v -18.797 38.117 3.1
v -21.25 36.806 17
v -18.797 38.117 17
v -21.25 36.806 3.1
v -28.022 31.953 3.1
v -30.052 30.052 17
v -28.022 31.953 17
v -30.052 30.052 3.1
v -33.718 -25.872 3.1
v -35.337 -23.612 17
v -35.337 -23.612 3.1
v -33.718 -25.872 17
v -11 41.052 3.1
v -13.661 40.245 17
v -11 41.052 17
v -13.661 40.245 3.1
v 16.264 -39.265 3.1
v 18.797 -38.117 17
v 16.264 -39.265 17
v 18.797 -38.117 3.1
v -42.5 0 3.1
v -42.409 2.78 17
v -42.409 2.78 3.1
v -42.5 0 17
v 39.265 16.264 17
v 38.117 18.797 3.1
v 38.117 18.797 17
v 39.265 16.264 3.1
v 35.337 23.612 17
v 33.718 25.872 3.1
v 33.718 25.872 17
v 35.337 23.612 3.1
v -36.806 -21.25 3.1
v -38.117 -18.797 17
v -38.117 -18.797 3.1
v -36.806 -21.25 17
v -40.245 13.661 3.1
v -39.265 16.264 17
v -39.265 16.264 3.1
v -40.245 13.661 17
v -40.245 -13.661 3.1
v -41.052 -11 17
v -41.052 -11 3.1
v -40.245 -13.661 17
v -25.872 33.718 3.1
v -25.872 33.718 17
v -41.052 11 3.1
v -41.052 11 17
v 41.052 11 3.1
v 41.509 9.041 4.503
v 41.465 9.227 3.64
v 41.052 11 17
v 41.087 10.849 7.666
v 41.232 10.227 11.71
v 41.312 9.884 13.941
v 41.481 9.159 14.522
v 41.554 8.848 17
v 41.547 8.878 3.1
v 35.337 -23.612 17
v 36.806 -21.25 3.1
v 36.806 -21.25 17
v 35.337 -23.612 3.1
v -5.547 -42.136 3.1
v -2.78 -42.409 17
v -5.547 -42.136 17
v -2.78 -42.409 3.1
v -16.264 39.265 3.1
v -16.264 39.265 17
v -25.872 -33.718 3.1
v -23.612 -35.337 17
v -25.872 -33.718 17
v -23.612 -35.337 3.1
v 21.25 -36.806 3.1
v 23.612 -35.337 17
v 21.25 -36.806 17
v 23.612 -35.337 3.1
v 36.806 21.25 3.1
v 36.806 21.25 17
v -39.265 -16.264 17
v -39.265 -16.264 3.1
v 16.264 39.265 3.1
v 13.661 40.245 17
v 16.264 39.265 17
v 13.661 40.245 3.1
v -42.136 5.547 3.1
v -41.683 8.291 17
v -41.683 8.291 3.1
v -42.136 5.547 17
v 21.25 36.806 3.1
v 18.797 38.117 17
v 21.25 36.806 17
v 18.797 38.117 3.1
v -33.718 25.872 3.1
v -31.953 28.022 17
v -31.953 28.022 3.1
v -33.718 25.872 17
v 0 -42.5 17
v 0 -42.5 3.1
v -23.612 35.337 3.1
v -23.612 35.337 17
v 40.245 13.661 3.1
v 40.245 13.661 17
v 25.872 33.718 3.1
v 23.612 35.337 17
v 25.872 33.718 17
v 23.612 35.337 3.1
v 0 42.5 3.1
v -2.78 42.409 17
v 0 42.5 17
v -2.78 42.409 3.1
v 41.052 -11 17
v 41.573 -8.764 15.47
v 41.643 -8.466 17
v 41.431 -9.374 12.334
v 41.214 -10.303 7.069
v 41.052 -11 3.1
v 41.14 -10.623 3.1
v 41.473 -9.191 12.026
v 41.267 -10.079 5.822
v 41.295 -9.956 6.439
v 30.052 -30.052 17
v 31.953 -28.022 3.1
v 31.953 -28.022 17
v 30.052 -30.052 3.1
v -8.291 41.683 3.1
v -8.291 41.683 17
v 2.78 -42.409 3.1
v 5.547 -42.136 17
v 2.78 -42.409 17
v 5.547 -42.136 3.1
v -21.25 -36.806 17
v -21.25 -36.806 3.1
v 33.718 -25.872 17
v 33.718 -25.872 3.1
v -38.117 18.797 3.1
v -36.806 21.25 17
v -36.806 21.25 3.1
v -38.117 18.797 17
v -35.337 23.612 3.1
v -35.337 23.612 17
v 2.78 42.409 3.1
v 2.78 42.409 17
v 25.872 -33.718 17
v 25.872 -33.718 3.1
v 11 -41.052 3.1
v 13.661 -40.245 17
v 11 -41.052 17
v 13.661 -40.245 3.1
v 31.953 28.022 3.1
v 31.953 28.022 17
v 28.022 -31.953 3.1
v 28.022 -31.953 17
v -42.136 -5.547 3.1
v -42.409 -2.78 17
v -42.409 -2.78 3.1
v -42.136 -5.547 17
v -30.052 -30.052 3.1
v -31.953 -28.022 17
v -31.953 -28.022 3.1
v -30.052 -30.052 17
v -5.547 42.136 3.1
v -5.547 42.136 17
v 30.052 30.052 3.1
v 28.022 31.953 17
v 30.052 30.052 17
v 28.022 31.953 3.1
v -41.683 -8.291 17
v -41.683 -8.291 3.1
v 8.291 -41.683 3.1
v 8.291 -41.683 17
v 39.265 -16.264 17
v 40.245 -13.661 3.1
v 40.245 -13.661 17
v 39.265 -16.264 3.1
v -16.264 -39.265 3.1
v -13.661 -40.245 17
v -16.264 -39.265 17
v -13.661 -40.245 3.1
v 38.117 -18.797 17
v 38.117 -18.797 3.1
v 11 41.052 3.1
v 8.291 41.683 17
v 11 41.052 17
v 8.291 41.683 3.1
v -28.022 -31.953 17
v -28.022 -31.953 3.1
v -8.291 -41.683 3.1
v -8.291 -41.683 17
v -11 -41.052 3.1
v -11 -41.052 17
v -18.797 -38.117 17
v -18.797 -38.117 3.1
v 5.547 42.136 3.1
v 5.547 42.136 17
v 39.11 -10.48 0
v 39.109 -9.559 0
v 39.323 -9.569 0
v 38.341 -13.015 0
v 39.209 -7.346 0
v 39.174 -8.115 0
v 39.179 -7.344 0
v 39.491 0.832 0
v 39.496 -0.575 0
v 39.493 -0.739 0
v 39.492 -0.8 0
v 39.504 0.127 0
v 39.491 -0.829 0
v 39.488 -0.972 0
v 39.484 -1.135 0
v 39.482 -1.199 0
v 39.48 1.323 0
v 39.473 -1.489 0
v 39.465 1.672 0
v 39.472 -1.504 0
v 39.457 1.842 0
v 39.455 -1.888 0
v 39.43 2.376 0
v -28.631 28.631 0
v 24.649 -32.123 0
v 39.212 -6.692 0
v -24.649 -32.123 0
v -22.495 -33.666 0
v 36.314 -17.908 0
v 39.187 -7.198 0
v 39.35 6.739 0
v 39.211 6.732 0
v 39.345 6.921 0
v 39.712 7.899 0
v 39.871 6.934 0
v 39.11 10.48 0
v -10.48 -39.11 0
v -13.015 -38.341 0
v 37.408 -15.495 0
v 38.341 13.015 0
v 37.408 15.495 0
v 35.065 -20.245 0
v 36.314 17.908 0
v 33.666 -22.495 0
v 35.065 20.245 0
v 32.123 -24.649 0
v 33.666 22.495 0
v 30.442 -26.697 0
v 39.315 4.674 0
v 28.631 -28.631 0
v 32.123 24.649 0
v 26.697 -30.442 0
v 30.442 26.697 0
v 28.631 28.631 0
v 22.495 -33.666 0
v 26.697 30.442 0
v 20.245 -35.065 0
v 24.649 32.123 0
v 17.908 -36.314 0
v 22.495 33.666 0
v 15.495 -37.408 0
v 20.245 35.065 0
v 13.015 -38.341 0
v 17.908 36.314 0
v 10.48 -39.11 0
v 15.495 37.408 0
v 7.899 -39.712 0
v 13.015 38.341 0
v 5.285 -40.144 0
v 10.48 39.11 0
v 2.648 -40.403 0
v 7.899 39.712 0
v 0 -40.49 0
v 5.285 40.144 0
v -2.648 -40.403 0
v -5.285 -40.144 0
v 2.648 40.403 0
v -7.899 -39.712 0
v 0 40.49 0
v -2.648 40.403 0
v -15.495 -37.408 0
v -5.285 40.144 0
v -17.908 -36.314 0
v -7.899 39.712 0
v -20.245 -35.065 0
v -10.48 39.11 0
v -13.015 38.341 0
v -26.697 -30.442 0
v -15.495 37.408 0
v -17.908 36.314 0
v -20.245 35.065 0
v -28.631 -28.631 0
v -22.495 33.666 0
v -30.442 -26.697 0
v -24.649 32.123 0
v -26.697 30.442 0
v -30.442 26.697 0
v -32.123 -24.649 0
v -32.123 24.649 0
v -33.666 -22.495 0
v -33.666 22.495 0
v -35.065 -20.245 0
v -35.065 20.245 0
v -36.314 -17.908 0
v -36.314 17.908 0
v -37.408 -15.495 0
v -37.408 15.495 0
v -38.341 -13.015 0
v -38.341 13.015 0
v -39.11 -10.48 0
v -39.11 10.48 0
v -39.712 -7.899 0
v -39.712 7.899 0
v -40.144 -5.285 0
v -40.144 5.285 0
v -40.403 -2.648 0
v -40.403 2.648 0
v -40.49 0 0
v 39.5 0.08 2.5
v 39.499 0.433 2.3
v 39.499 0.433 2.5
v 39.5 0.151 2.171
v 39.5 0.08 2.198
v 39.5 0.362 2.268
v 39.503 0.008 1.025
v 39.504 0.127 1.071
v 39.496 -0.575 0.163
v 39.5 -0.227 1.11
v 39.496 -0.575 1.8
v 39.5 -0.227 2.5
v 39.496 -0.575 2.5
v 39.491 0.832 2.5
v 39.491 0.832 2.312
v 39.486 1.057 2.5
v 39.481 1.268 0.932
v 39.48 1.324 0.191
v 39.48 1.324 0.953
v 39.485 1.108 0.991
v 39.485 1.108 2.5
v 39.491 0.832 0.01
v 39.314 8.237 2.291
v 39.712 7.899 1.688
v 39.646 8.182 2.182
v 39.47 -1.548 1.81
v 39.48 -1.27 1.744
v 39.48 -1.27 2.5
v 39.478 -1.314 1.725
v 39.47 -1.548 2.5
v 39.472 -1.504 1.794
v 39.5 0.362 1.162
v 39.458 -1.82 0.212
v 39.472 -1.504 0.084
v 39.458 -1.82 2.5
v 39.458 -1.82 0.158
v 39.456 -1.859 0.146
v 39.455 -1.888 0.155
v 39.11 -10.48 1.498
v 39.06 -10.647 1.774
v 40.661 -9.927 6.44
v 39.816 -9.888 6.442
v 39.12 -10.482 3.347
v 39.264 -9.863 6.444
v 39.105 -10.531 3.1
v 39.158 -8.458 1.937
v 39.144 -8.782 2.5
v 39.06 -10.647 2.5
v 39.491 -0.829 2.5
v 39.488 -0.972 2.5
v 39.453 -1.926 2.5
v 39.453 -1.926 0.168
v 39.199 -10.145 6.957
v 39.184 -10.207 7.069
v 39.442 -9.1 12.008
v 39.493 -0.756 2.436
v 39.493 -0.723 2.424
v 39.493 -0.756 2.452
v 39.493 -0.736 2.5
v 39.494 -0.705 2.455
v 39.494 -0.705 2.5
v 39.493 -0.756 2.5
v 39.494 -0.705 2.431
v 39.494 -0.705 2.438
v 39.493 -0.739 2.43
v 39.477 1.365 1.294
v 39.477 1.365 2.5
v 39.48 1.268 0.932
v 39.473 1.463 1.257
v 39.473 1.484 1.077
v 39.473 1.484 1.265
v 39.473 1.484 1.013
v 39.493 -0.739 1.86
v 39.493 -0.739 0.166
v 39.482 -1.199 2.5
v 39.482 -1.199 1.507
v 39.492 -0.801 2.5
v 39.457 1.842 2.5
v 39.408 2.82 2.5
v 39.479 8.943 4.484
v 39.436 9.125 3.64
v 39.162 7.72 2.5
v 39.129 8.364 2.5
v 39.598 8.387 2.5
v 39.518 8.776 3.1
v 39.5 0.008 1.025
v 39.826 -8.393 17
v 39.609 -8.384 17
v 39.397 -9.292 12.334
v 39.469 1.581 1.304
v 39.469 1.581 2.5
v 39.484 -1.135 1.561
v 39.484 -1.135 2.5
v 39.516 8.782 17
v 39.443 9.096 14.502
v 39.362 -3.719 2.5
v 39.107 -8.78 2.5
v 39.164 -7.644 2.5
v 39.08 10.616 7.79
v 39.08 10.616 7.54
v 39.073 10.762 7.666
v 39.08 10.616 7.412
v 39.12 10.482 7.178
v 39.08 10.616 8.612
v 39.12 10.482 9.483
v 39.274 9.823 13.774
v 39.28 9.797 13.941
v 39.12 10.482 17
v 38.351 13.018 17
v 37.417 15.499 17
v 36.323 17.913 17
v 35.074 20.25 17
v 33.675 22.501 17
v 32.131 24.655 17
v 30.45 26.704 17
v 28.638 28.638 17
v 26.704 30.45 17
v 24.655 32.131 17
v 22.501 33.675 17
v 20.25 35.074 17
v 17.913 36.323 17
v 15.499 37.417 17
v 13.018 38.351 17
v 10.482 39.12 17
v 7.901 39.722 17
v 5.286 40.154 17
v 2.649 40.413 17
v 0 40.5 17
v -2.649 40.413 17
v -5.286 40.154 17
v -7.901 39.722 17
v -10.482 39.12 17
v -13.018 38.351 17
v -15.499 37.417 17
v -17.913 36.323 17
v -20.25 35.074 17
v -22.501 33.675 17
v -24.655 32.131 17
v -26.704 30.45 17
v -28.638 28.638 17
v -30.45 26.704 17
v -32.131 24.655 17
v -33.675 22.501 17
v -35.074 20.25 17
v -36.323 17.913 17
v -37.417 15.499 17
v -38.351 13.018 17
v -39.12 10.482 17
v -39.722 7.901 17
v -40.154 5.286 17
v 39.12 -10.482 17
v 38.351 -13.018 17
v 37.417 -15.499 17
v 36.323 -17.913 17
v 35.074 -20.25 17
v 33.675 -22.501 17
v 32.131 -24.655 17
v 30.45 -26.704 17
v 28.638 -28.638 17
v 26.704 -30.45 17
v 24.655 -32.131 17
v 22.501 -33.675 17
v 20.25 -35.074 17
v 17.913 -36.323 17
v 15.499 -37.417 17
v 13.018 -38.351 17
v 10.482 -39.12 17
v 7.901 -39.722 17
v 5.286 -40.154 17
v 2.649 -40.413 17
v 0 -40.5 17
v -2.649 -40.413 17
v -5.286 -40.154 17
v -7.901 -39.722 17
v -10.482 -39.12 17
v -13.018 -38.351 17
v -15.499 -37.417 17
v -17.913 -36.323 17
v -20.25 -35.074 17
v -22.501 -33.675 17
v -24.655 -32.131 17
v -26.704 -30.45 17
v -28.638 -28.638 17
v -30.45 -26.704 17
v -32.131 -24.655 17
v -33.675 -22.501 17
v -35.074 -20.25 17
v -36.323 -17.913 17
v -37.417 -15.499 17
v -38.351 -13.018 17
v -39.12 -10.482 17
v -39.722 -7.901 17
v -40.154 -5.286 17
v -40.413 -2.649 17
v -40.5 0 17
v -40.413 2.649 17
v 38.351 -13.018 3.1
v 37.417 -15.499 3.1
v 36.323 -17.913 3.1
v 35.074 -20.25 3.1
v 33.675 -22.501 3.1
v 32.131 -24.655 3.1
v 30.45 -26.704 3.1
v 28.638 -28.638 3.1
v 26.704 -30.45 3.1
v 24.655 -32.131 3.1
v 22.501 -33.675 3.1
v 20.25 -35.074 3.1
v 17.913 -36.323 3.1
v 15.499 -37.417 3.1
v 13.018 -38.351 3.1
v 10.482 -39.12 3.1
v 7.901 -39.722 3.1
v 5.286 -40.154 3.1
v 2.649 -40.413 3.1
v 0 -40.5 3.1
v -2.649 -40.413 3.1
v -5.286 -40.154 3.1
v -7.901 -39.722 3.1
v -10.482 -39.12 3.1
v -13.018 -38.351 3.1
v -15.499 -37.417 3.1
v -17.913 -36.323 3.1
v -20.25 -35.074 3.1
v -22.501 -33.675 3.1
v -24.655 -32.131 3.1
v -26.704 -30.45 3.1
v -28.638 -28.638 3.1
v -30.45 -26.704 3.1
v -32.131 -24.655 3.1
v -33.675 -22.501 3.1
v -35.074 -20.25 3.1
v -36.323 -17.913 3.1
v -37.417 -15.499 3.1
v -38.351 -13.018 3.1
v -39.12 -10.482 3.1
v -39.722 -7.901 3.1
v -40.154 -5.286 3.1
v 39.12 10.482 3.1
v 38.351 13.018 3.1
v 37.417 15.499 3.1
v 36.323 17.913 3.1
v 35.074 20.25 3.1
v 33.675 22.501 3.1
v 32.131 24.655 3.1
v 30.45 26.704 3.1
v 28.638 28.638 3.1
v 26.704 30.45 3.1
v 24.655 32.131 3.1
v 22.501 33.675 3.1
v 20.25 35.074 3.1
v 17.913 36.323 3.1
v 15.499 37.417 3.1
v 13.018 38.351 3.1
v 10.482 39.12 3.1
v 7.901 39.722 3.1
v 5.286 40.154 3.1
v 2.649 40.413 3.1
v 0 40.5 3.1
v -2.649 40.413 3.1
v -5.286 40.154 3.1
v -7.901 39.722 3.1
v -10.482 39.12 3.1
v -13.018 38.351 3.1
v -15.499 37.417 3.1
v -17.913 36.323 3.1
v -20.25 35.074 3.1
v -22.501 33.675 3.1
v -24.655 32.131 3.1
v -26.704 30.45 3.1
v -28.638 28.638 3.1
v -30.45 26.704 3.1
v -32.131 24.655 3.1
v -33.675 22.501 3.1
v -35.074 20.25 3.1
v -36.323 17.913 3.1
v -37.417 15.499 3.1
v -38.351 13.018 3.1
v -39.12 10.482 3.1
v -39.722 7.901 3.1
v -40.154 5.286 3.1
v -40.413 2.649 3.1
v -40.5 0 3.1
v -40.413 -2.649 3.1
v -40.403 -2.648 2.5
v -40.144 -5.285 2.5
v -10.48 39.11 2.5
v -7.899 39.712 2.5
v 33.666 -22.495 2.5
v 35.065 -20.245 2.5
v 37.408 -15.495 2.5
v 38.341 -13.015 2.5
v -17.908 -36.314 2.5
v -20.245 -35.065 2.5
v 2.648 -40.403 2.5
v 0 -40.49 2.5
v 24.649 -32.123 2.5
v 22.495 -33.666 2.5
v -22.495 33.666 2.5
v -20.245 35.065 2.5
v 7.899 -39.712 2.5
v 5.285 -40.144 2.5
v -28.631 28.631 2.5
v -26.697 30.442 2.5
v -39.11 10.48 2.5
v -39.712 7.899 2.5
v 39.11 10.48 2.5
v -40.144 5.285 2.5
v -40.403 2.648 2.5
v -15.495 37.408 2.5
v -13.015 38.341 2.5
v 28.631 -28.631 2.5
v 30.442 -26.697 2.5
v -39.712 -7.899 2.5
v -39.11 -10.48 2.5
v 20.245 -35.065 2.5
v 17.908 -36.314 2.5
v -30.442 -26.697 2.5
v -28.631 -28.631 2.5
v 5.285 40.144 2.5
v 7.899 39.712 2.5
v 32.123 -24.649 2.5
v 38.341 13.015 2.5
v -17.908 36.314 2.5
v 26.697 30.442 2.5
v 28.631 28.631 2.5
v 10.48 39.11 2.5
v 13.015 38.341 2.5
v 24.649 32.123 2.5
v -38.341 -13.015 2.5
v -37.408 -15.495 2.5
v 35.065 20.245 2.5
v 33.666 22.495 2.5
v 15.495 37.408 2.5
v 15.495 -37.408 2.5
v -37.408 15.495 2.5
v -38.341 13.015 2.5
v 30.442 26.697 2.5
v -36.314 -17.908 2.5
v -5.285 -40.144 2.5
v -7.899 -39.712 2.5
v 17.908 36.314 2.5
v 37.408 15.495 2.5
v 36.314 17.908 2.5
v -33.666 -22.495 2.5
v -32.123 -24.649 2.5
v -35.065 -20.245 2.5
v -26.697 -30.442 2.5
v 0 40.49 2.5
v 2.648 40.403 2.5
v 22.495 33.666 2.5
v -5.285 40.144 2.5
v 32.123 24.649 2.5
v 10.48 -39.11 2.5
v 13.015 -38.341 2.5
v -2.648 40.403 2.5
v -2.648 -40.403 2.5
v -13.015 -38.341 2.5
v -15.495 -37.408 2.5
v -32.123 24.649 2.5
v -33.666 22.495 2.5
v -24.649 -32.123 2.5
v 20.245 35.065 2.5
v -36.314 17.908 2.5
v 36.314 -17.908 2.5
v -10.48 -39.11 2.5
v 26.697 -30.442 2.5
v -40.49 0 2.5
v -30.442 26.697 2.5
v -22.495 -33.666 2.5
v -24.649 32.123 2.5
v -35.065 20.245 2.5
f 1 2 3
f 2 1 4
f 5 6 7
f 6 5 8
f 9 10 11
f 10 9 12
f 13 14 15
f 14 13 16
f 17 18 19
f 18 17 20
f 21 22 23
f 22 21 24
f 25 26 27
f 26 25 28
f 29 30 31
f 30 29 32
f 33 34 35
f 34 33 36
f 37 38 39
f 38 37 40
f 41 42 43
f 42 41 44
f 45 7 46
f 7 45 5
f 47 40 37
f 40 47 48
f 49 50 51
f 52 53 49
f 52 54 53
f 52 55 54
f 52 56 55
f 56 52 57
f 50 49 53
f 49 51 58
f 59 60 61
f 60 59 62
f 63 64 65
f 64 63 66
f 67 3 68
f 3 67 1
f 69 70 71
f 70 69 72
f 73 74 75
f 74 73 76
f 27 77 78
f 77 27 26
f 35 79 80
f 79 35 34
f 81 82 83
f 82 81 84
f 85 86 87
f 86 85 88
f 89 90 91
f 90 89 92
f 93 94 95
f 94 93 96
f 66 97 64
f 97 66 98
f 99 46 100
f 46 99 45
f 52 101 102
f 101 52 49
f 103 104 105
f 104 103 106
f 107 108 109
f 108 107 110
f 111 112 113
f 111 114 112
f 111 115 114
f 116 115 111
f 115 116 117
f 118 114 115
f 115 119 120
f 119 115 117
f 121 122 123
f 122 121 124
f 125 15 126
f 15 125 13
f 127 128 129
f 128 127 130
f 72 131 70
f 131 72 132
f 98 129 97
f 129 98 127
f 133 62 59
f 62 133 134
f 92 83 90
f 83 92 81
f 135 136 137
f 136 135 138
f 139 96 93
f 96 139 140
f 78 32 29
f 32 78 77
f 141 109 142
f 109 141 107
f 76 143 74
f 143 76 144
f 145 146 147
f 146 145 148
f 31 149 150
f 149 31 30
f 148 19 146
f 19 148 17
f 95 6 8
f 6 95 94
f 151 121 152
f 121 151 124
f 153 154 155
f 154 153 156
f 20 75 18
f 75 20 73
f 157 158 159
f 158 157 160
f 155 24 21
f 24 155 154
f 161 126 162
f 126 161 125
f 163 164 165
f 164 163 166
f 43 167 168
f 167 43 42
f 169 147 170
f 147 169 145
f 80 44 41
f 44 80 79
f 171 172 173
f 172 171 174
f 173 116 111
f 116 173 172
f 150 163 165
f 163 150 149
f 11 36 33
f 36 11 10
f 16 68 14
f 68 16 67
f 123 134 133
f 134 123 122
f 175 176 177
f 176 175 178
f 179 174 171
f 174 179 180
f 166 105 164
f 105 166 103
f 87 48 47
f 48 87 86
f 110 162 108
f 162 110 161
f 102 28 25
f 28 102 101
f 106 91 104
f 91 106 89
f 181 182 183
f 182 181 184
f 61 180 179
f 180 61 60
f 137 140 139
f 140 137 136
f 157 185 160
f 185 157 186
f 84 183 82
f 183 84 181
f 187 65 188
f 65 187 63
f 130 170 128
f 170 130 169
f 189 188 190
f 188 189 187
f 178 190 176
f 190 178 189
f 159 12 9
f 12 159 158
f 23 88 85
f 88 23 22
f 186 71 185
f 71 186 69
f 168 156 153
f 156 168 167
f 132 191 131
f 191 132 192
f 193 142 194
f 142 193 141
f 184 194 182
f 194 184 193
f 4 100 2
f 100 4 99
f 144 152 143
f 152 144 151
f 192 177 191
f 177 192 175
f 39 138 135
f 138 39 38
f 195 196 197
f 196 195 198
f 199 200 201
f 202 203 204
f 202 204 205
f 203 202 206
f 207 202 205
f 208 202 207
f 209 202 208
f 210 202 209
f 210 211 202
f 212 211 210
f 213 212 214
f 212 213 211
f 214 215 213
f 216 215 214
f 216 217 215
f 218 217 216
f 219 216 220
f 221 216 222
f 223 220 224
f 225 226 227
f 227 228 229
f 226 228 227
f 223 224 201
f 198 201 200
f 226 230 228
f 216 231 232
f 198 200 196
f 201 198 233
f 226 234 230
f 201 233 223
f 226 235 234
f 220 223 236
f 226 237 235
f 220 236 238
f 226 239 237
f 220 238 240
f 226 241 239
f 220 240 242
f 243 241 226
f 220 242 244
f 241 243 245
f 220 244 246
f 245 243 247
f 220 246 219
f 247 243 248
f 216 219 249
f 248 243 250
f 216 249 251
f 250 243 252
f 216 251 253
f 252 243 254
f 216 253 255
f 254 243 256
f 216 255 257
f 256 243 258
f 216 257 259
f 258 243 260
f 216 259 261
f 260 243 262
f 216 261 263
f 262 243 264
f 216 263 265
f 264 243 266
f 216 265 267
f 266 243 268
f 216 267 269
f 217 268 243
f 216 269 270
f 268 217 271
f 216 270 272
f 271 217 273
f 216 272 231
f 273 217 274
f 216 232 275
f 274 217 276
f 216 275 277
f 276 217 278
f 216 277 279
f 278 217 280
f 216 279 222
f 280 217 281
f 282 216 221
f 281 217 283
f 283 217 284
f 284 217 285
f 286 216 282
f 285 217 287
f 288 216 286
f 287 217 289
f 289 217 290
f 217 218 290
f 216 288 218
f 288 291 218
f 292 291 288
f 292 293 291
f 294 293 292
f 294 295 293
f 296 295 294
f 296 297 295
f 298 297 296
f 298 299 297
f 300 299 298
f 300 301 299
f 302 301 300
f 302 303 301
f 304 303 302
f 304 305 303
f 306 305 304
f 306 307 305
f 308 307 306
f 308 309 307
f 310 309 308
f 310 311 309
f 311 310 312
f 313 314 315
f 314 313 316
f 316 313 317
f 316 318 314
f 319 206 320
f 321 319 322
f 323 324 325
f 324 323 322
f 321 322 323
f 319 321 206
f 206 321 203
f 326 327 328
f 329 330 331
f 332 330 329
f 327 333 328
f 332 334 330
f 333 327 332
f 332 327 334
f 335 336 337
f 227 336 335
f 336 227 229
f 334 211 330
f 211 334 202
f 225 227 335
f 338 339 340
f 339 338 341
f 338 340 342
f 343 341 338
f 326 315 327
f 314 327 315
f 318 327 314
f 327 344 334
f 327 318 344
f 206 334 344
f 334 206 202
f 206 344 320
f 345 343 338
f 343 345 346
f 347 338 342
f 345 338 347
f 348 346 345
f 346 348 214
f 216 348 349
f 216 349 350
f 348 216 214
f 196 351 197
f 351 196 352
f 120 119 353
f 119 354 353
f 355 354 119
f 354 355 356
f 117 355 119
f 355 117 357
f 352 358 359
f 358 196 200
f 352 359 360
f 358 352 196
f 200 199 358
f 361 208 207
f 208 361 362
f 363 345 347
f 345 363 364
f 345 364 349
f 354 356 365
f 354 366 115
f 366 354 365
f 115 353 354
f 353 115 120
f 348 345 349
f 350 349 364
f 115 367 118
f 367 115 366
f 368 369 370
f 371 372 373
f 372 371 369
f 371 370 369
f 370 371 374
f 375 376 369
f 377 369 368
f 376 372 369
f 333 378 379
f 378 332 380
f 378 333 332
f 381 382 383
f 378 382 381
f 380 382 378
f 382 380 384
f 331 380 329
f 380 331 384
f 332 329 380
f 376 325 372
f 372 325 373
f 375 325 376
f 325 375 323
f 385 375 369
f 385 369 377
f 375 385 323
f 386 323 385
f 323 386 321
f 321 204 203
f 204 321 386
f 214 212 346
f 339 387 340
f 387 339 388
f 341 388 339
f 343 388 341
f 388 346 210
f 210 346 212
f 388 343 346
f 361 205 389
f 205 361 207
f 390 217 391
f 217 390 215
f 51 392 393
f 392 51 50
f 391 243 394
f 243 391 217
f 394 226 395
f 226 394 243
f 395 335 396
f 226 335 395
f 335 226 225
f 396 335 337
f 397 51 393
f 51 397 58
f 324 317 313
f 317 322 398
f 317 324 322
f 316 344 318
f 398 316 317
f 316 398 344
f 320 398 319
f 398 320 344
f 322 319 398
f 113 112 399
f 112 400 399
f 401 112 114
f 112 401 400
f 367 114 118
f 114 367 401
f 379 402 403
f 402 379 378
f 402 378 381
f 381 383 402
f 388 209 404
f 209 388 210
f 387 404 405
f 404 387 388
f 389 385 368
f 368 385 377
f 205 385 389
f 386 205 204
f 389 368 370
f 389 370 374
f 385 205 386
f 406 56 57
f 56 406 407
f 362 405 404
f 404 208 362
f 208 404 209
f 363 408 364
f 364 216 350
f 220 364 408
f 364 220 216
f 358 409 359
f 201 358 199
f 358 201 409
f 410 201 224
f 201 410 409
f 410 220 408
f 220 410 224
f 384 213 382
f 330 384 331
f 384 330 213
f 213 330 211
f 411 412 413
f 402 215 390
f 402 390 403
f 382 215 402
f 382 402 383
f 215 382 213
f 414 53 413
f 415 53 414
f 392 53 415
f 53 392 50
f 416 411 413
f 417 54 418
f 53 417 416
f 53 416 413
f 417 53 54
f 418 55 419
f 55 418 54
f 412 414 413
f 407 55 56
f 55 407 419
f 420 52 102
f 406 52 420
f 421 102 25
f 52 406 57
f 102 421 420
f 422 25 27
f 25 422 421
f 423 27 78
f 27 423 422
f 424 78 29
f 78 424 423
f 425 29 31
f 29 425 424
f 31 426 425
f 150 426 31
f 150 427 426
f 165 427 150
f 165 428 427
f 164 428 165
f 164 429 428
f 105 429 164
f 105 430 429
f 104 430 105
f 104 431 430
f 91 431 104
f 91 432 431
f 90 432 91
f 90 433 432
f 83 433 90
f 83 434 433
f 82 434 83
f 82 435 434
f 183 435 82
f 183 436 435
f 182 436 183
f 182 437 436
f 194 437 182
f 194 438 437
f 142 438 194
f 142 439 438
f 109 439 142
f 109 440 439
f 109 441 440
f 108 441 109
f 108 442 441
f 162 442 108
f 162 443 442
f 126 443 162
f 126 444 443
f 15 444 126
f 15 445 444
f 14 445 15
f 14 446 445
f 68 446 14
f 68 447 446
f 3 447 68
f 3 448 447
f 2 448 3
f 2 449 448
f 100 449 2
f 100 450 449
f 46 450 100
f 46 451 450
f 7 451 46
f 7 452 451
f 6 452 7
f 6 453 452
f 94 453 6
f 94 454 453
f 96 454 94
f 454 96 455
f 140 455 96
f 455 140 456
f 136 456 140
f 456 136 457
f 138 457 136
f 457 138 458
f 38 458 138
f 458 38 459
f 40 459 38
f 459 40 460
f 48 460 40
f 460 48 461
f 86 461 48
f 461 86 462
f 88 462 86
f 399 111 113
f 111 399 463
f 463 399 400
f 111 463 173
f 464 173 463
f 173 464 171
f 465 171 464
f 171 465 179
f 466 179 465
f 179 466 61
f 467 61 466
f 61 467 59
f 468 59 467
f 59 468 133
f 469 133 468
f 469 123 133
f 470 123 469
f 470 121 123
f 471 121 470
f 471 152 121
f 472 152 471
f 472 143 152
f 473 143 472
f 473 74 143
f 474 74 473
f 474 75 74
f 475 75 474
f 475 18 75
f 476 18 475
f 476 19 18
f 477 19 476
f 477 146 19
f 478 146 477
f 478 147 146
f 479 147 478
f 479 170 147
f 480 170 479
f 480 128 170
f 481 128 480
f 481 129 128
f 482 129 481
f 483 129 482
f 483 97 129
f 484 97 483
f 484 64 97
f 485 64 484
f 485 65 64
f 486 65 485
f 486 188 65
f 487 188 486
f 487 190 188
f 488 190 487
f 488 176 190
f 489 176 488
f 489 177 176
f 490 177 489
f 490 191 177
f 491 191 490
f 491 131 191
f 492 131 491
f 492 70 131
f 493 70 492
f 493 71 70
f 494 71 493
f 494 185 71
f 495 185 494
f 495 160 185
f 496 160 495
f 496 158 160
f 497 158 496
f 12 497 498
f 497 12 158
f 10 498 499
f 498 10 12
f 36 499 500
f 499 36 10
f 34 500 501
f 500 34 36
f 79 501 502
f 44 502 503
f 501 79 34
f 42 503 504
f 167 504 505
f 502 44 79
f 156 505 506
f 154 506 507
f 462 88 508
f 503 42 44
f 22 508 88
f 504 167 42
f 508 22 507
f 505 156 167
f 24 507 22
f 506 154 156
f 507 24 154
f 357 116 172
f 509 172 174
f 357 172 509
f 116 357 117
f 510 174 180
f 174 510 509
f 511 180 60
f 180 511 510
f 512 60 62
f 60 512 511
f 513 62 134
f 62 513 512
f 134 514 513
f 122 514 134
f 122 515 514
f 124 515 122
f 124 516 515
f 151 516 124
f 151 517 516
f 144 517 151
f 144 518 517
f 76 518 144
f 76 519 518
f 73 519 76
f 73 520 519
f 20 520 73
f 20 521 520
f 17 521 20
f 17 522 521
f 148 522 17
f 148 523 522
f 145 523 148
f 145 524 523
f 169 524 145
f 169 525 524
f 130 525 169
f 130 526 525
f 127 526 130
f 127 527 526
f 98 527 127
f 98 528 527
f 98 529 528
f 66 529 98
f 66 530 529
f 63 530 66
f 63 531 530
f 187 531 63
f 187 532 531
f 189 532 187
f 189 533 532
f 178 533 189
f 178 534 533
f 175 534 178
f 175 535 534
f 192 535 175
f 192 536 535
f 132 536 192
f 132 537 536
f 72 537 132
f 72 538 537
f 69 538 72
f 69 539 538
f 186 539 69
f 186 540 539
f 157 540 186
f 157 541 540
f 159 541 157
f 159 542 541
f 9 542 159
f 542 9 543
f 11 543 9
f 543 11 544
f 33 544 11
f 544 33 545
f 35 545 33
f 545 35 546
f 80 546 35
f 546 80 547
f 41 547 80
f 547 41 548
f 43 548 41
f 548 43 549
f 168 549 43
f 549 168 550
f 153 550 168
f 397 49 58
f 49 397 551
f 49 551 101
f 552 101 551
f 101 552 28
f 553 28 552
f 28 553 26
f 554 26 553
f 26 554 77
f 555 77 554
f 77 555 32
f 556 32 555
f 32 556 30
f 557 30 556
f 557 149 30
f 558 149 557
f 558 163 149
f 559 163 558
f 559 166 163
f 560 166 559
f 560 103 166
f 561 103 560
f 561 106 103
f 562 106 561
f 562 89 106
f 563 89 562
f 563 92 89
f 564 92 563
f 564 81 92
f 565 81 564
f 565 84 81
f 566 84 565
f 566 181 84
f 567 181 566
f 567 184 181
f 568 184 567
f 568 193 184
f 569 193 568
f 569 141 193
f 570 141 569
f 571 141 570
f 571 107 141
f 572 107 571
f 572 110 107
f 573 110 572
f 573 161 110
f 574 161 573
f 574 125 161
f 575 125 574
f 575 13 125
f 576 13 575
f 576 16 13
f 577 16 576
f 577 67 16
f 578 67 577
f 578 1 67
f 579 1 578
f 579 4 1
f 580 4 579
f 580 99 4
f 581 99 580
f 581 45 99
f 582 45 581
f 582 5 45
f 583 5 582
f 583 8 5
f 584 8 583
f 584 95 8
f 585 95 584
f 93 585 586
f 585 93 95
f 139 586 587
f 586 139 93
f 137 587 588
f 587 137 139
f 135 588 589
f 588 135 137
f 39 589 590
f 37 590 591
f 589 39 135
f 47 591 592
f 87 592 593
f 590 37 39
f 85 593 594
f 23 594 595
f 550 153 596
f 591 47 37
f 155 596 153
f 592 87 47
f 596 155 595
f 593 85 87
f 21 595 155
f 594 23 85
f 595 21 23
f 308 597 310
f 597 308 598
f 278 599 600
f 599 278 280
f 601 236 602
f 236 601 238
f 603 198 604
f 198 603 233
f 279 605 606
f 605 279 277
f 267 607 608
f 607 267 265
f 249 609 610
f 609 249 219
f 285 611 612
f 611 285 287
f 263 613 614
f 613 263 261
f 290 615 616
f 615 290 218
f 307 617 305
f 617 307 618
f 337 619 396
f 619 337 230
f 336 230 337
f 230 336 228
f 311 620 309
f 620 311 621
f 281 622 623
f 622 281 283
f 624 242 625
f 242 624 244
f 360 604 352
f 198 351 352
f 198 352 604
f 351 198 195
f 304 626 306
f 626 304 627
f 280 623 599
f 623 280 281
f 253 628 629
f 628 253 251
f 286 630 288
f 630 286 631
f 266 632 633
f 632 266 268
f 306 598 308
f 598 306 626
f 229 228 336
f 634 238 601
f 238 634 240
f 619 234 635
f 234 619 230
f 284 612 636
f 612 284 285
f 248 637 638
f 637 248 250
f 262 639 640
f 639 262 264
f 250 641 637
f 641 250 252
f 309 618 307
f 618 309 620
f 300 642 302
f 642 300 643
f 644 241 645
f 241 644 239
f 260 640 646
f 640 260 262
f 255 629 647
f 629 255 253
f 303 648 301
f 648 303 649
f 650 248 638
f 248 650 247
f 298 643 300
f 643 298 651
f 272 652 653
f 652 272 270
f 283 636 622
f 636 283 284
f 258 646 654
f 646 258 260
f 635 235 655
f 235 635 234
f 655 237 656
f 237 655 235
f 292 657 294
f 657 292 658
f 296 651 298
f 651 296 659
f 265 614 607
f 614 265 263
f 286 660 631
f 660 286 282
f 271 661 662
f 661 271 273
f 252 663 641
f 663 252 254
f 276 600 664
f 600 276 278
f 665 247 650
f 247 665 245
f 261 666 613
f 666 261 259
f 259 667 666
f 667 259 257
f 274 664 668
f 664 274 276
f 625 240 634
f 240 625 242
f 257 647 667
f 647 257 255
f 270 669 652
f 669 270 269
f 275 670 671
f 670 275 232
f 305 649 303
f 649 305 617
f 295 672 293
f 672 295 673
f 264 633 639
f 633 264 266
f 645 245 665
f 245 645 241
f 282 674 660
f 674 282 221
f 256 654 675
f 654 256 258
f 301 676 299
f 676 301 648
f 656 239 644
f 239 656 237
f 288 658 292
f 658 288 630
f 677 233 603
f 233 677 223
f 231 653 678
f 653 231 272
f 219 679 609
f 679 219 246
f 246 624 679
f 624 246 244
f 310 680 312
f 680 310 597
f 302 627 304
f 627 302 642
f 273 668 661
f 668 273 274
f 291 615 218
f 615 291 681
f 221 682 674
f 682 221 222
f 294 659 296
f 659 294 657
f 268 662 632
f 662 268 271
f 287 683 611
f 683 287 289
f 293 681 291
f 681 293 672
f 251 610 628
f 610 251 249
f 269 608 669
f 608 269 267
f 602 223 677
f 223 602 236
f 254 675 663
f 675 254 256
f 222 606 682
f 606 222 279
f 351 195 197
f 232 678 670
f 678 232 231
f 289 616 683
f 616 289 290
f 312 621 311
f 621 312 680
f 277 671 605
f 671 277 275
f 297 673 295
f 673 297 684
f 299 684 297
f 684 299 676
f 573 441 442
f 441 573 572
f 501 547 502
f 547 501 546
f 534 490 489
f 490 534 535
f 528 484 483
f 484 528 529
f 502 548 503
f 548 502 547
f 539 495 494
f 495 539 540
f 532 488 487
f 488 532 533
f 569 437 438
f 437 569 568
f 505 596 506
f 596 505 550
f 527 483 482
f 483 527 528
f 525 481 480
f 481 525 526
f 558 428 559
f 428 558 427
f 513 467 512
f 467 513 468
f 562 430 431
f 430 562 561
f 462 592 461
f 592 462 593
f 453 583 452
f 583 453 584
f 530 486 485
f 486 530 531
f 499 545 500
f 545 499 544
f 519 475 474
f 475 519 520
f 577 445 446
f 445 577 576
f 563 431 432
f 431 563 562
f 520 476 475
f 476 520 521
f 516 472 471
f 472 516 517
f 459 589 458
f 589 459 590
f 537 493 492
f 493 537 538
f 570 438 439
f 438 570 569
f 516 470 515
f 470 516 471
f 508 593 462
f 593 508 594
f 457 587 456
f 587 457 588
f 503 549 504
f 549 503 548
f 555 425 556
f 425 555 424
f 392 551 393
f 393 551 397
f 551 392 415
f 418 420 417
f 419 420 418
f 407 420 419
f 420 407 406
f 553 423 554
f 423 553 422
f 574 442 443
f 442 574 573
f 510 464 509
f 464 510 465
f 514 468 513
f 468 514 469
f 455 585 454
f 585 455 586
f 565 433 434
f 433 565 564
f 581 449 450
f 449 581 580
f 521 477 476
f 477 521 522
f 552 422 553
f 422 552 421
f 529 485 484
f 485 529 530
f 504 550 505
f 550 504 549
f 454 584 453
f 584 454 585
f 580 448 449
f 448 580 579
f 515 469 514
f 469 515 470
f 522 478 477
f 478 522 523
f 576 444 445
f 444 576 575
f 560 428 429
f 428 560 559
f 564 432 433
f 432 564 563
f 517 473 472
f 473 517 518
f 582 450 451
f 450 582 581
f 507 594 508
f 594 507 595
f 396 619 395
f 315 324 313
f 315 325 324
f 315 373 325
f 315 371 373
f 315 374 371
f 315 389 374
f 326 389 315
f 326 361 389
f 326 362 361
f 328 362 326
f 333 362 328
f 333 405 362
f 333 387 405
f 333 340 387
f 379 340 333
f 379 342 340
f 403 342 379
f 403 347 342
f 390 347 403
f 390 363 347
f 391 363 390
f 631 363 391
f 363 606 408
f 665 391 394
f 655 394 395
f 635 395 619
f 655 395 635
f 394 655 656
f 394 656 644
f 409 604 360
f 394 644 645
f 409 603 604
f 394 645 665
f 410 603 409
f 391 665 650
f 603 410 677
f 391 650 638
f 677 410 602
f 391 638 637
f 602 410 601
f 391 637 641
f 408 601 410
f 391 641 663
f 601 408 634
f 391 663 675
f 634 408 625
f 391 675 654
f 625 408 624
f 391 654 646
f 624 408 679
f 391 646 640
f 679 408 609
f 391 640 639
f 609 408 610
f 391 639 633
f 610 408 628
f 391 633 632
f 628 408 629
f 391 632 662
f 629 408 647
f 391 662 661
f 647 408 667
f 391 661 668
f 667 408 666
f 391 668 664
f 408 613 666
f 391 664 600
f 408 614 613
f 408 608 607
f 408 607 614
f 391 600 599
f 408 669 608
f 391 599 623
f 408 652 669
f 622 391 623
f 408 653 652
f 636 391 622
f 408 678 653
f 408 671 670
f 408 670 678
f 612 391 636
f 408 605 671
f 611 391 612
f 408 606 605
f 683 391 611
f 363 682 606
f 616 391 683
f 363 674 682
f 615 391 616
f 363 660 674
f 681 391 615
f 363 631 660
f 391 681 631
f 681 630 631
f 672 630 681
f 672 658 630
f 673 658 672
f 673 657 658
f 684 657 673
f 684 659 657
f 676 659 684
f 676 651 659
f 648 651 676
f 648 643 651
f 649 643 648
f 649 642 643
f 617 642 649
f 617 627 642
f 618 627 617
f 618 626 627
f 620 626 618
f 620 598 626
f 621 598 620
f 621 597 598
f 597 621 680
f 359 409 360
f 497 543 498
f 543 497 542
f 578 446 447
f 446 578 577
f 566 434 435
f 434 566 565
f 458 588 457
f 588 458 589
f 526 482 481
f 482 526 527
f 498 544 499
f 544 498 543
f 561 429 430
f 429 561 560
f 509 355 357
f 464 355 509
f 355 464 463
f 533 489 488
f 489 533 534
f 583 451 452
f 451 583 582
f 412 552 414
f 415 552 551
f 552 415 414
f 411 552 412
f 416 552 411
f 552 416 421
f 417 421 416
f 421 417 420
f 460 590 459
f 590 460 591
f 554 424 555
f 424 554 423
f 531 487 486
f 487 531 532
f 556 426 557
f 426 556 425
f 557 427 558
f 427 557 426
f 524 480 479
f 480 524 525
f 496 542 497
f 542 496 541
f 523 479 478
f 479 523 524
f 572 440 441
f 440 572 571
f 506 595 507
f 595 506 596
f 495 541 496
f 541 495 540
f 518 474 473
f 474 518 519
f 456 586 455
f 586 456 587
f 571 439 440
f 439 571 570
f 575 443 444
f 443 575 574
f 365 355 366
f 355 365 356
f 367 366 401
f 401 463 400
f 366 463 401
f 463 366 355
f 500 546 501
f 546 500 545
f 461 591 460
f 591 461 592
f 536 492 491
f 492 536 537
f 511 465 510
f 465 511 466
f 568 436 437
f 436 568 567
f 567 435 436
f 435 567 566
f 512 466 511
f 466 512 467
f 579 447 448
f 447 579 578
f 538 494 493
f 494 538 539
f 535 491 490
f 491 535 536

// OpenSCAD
//
// Voronoi-style cylindrical cup
// Units: millimeters
//
// Default dimensions:
//   Diameter: 85 mm (8.5 cm)
//   Height:   20 mm (2 cm)
//
// The parameters at the top are intended to be changed.
//
// This model creates a thin cylindrical cup with a deterministic
// Voronoi-like organic perforation pattern. The pattern is made by
// subtracting irregular, overlapping "cell" openings from the wall.
// A solid bottom is retained for use as a small cup/container.
//
// Recommended for FDM printing. For resin printing, increase wall and
// bottom thickness as appropriate.
//

$fn = 96;

// ========================= PARAMETERS =========================
diameter        = 85;       // outside diameter, mm
height          = 20;       // total height, mm
wall            = 2.0;      // nominal wall thickness, mm
bottom          = 2.5;      // bottom thickness, mm

// Pattern parameters
cell_count      = 34;       // number of Voronoi seed points
cell_size       = 9.0;      // typical opening diameter, mm
cell_variation  = 0.30;     // 0..1, variation in opening size
pattern_z_scale = 1.00;     // vertical scale of pattern
edge_rim        = 3.0;      // solid material kept at top/bottom edges

// Make the openings somewhat "webbed" rather than perfectly circular.
irregularity    = 0.38;     // 0 = circular, higher = more organic
sides           = 9;        // polygon resolution of each opening

// Deterministic seed; change this for a different pattern.
random_seed     = 73129;

// ========================= DERIVED VALUES ======================
outer_r = diameter / 2;
inner_r = outer_r - wall;
usable_h = height - bottom - 2*edge_rim;

// A point is represented as [x,y].
function hash01(n) =
    let(v = sin(n * 12.9898 + random_seed * 78.233) * 43758.5453)
    v - floor(v);

function rand_range(a,b,n) = a + (b-a)*hash01(n);

// Generate points in a rectangular "pattern sheet".
// The sheet is wrapped around the cylinder circumference.
function seed_x(i) =
    -PI*outer_r + (2*PI*outer_r) * hash01(i*17+1);

function seed_z(i) =
    edge_rim + usable_h * hash01(i*17+2);

function seed_r(i) =
    cell_size * (0.72 + cell_variation * hash01(i*17+3));

// Convert wrapped pattern coordinates to a point on the cylinder.
// x is arc length around circumference; z is height.
function wrap_point(x,z) =
    [outer_r*cos(x/outer_r), outer_r*sin(x/outer_r), z];

// ========================= VORONOI-STYLE OPENINGS =============
//
// A true Voronoi diagram is defined by nearest-neighbour cells.
// For a printable cup, we use each seed as the center of an organic
// cell opening. Neighboring seeds influence the opening size, giving
// the characteristic irregular Voronoi appearance.
//
// The opening is made as a low-sided, smoothly varied polygon and is
// oriented tangent to the cylindrical surface.

module organic_opening(i) {
    x = seed_x(i);
    z = seed_z(i);
    r = seed_r(i);

    // Tangential polygon on a local XY plane.
    // It is subsequently rotated to face radially outward.
    pts = [
        for (k=[0:sides-1])
            let(
                a = 360*k/sides,
                rr = r * (
                    1
                    + irregularity*0.16*(
                        hash01(i*101+k*7+4)-0.5
                    )
                )
            )
            [rr*cos(a), rr*sin(a)]
    ];

    // A small local cylinder/polygon cutter.
    // The cutter is longer than the wall so it fully penetrates it.
    translate(wrap_point(x,z))
        rotate([0,90,x/outer_r])
            linear_extrude(height=wall+4, center=true)
                polygon(points=pts);
}

// ========================= CUP ================================

difference() {
    // Main cup body.
    union() {
        // Outer cylinder
        cylinder(r=outer_r, h=height);

        // Slightly reinforced bottom disk
        cylinder(r=outer_r-0.5, h=bottom);
    }

    // Hollow interior, leaving the bottom.
    translate([0,0,bottom])
        cylinder(r=inner_r, h=height-bottom+0.2);

    // Voronoi-style perforations.
    for (i=[0:cell_count-1])
        organic_opening(i);

    // Keep a solid band around the upper and lower rim.
    // This masks cutters close to the boundaries.
    //
    // The openings are already distributed away from the edges;
    // these two rings provide additional robustness.
    translate([0,0,height-edge_rim])
        difference() {
            cylinder(r=outer_r+0.2,h=edge_rim+0.3);
            cylinder(r=inner_r-0.01,h=edge_rim+0.5);
        }

    translate([0,0,-0.1])
        difference() {
            cylinder(r=outer_r+0.2,h=edge_rim+0.2);
            cylinder(r=inner_r-0.01,h=edge_rim+0.4);
        }
}

// ========================= NOTES ===============================
//
// To make it more open:
//   cell_count = 24;
//   cell_size  = 11;
//
// To make smaller, denser cells:
//   cell_count = 55;
//   cell_size  = 6.5;
//
// For a sturdier print:
//   wall   = 2.5;
//   bottom = 3;
//
// For a more organic pattern:
//   irregularity = 0.7;
//   sides = 8;
//
// IMPORTANT:
// This is a self-contained OpenSCAD model and does not require an
// external library. The pattern is deterministic: changing
// random_seed generates a different repeatable pattern.
